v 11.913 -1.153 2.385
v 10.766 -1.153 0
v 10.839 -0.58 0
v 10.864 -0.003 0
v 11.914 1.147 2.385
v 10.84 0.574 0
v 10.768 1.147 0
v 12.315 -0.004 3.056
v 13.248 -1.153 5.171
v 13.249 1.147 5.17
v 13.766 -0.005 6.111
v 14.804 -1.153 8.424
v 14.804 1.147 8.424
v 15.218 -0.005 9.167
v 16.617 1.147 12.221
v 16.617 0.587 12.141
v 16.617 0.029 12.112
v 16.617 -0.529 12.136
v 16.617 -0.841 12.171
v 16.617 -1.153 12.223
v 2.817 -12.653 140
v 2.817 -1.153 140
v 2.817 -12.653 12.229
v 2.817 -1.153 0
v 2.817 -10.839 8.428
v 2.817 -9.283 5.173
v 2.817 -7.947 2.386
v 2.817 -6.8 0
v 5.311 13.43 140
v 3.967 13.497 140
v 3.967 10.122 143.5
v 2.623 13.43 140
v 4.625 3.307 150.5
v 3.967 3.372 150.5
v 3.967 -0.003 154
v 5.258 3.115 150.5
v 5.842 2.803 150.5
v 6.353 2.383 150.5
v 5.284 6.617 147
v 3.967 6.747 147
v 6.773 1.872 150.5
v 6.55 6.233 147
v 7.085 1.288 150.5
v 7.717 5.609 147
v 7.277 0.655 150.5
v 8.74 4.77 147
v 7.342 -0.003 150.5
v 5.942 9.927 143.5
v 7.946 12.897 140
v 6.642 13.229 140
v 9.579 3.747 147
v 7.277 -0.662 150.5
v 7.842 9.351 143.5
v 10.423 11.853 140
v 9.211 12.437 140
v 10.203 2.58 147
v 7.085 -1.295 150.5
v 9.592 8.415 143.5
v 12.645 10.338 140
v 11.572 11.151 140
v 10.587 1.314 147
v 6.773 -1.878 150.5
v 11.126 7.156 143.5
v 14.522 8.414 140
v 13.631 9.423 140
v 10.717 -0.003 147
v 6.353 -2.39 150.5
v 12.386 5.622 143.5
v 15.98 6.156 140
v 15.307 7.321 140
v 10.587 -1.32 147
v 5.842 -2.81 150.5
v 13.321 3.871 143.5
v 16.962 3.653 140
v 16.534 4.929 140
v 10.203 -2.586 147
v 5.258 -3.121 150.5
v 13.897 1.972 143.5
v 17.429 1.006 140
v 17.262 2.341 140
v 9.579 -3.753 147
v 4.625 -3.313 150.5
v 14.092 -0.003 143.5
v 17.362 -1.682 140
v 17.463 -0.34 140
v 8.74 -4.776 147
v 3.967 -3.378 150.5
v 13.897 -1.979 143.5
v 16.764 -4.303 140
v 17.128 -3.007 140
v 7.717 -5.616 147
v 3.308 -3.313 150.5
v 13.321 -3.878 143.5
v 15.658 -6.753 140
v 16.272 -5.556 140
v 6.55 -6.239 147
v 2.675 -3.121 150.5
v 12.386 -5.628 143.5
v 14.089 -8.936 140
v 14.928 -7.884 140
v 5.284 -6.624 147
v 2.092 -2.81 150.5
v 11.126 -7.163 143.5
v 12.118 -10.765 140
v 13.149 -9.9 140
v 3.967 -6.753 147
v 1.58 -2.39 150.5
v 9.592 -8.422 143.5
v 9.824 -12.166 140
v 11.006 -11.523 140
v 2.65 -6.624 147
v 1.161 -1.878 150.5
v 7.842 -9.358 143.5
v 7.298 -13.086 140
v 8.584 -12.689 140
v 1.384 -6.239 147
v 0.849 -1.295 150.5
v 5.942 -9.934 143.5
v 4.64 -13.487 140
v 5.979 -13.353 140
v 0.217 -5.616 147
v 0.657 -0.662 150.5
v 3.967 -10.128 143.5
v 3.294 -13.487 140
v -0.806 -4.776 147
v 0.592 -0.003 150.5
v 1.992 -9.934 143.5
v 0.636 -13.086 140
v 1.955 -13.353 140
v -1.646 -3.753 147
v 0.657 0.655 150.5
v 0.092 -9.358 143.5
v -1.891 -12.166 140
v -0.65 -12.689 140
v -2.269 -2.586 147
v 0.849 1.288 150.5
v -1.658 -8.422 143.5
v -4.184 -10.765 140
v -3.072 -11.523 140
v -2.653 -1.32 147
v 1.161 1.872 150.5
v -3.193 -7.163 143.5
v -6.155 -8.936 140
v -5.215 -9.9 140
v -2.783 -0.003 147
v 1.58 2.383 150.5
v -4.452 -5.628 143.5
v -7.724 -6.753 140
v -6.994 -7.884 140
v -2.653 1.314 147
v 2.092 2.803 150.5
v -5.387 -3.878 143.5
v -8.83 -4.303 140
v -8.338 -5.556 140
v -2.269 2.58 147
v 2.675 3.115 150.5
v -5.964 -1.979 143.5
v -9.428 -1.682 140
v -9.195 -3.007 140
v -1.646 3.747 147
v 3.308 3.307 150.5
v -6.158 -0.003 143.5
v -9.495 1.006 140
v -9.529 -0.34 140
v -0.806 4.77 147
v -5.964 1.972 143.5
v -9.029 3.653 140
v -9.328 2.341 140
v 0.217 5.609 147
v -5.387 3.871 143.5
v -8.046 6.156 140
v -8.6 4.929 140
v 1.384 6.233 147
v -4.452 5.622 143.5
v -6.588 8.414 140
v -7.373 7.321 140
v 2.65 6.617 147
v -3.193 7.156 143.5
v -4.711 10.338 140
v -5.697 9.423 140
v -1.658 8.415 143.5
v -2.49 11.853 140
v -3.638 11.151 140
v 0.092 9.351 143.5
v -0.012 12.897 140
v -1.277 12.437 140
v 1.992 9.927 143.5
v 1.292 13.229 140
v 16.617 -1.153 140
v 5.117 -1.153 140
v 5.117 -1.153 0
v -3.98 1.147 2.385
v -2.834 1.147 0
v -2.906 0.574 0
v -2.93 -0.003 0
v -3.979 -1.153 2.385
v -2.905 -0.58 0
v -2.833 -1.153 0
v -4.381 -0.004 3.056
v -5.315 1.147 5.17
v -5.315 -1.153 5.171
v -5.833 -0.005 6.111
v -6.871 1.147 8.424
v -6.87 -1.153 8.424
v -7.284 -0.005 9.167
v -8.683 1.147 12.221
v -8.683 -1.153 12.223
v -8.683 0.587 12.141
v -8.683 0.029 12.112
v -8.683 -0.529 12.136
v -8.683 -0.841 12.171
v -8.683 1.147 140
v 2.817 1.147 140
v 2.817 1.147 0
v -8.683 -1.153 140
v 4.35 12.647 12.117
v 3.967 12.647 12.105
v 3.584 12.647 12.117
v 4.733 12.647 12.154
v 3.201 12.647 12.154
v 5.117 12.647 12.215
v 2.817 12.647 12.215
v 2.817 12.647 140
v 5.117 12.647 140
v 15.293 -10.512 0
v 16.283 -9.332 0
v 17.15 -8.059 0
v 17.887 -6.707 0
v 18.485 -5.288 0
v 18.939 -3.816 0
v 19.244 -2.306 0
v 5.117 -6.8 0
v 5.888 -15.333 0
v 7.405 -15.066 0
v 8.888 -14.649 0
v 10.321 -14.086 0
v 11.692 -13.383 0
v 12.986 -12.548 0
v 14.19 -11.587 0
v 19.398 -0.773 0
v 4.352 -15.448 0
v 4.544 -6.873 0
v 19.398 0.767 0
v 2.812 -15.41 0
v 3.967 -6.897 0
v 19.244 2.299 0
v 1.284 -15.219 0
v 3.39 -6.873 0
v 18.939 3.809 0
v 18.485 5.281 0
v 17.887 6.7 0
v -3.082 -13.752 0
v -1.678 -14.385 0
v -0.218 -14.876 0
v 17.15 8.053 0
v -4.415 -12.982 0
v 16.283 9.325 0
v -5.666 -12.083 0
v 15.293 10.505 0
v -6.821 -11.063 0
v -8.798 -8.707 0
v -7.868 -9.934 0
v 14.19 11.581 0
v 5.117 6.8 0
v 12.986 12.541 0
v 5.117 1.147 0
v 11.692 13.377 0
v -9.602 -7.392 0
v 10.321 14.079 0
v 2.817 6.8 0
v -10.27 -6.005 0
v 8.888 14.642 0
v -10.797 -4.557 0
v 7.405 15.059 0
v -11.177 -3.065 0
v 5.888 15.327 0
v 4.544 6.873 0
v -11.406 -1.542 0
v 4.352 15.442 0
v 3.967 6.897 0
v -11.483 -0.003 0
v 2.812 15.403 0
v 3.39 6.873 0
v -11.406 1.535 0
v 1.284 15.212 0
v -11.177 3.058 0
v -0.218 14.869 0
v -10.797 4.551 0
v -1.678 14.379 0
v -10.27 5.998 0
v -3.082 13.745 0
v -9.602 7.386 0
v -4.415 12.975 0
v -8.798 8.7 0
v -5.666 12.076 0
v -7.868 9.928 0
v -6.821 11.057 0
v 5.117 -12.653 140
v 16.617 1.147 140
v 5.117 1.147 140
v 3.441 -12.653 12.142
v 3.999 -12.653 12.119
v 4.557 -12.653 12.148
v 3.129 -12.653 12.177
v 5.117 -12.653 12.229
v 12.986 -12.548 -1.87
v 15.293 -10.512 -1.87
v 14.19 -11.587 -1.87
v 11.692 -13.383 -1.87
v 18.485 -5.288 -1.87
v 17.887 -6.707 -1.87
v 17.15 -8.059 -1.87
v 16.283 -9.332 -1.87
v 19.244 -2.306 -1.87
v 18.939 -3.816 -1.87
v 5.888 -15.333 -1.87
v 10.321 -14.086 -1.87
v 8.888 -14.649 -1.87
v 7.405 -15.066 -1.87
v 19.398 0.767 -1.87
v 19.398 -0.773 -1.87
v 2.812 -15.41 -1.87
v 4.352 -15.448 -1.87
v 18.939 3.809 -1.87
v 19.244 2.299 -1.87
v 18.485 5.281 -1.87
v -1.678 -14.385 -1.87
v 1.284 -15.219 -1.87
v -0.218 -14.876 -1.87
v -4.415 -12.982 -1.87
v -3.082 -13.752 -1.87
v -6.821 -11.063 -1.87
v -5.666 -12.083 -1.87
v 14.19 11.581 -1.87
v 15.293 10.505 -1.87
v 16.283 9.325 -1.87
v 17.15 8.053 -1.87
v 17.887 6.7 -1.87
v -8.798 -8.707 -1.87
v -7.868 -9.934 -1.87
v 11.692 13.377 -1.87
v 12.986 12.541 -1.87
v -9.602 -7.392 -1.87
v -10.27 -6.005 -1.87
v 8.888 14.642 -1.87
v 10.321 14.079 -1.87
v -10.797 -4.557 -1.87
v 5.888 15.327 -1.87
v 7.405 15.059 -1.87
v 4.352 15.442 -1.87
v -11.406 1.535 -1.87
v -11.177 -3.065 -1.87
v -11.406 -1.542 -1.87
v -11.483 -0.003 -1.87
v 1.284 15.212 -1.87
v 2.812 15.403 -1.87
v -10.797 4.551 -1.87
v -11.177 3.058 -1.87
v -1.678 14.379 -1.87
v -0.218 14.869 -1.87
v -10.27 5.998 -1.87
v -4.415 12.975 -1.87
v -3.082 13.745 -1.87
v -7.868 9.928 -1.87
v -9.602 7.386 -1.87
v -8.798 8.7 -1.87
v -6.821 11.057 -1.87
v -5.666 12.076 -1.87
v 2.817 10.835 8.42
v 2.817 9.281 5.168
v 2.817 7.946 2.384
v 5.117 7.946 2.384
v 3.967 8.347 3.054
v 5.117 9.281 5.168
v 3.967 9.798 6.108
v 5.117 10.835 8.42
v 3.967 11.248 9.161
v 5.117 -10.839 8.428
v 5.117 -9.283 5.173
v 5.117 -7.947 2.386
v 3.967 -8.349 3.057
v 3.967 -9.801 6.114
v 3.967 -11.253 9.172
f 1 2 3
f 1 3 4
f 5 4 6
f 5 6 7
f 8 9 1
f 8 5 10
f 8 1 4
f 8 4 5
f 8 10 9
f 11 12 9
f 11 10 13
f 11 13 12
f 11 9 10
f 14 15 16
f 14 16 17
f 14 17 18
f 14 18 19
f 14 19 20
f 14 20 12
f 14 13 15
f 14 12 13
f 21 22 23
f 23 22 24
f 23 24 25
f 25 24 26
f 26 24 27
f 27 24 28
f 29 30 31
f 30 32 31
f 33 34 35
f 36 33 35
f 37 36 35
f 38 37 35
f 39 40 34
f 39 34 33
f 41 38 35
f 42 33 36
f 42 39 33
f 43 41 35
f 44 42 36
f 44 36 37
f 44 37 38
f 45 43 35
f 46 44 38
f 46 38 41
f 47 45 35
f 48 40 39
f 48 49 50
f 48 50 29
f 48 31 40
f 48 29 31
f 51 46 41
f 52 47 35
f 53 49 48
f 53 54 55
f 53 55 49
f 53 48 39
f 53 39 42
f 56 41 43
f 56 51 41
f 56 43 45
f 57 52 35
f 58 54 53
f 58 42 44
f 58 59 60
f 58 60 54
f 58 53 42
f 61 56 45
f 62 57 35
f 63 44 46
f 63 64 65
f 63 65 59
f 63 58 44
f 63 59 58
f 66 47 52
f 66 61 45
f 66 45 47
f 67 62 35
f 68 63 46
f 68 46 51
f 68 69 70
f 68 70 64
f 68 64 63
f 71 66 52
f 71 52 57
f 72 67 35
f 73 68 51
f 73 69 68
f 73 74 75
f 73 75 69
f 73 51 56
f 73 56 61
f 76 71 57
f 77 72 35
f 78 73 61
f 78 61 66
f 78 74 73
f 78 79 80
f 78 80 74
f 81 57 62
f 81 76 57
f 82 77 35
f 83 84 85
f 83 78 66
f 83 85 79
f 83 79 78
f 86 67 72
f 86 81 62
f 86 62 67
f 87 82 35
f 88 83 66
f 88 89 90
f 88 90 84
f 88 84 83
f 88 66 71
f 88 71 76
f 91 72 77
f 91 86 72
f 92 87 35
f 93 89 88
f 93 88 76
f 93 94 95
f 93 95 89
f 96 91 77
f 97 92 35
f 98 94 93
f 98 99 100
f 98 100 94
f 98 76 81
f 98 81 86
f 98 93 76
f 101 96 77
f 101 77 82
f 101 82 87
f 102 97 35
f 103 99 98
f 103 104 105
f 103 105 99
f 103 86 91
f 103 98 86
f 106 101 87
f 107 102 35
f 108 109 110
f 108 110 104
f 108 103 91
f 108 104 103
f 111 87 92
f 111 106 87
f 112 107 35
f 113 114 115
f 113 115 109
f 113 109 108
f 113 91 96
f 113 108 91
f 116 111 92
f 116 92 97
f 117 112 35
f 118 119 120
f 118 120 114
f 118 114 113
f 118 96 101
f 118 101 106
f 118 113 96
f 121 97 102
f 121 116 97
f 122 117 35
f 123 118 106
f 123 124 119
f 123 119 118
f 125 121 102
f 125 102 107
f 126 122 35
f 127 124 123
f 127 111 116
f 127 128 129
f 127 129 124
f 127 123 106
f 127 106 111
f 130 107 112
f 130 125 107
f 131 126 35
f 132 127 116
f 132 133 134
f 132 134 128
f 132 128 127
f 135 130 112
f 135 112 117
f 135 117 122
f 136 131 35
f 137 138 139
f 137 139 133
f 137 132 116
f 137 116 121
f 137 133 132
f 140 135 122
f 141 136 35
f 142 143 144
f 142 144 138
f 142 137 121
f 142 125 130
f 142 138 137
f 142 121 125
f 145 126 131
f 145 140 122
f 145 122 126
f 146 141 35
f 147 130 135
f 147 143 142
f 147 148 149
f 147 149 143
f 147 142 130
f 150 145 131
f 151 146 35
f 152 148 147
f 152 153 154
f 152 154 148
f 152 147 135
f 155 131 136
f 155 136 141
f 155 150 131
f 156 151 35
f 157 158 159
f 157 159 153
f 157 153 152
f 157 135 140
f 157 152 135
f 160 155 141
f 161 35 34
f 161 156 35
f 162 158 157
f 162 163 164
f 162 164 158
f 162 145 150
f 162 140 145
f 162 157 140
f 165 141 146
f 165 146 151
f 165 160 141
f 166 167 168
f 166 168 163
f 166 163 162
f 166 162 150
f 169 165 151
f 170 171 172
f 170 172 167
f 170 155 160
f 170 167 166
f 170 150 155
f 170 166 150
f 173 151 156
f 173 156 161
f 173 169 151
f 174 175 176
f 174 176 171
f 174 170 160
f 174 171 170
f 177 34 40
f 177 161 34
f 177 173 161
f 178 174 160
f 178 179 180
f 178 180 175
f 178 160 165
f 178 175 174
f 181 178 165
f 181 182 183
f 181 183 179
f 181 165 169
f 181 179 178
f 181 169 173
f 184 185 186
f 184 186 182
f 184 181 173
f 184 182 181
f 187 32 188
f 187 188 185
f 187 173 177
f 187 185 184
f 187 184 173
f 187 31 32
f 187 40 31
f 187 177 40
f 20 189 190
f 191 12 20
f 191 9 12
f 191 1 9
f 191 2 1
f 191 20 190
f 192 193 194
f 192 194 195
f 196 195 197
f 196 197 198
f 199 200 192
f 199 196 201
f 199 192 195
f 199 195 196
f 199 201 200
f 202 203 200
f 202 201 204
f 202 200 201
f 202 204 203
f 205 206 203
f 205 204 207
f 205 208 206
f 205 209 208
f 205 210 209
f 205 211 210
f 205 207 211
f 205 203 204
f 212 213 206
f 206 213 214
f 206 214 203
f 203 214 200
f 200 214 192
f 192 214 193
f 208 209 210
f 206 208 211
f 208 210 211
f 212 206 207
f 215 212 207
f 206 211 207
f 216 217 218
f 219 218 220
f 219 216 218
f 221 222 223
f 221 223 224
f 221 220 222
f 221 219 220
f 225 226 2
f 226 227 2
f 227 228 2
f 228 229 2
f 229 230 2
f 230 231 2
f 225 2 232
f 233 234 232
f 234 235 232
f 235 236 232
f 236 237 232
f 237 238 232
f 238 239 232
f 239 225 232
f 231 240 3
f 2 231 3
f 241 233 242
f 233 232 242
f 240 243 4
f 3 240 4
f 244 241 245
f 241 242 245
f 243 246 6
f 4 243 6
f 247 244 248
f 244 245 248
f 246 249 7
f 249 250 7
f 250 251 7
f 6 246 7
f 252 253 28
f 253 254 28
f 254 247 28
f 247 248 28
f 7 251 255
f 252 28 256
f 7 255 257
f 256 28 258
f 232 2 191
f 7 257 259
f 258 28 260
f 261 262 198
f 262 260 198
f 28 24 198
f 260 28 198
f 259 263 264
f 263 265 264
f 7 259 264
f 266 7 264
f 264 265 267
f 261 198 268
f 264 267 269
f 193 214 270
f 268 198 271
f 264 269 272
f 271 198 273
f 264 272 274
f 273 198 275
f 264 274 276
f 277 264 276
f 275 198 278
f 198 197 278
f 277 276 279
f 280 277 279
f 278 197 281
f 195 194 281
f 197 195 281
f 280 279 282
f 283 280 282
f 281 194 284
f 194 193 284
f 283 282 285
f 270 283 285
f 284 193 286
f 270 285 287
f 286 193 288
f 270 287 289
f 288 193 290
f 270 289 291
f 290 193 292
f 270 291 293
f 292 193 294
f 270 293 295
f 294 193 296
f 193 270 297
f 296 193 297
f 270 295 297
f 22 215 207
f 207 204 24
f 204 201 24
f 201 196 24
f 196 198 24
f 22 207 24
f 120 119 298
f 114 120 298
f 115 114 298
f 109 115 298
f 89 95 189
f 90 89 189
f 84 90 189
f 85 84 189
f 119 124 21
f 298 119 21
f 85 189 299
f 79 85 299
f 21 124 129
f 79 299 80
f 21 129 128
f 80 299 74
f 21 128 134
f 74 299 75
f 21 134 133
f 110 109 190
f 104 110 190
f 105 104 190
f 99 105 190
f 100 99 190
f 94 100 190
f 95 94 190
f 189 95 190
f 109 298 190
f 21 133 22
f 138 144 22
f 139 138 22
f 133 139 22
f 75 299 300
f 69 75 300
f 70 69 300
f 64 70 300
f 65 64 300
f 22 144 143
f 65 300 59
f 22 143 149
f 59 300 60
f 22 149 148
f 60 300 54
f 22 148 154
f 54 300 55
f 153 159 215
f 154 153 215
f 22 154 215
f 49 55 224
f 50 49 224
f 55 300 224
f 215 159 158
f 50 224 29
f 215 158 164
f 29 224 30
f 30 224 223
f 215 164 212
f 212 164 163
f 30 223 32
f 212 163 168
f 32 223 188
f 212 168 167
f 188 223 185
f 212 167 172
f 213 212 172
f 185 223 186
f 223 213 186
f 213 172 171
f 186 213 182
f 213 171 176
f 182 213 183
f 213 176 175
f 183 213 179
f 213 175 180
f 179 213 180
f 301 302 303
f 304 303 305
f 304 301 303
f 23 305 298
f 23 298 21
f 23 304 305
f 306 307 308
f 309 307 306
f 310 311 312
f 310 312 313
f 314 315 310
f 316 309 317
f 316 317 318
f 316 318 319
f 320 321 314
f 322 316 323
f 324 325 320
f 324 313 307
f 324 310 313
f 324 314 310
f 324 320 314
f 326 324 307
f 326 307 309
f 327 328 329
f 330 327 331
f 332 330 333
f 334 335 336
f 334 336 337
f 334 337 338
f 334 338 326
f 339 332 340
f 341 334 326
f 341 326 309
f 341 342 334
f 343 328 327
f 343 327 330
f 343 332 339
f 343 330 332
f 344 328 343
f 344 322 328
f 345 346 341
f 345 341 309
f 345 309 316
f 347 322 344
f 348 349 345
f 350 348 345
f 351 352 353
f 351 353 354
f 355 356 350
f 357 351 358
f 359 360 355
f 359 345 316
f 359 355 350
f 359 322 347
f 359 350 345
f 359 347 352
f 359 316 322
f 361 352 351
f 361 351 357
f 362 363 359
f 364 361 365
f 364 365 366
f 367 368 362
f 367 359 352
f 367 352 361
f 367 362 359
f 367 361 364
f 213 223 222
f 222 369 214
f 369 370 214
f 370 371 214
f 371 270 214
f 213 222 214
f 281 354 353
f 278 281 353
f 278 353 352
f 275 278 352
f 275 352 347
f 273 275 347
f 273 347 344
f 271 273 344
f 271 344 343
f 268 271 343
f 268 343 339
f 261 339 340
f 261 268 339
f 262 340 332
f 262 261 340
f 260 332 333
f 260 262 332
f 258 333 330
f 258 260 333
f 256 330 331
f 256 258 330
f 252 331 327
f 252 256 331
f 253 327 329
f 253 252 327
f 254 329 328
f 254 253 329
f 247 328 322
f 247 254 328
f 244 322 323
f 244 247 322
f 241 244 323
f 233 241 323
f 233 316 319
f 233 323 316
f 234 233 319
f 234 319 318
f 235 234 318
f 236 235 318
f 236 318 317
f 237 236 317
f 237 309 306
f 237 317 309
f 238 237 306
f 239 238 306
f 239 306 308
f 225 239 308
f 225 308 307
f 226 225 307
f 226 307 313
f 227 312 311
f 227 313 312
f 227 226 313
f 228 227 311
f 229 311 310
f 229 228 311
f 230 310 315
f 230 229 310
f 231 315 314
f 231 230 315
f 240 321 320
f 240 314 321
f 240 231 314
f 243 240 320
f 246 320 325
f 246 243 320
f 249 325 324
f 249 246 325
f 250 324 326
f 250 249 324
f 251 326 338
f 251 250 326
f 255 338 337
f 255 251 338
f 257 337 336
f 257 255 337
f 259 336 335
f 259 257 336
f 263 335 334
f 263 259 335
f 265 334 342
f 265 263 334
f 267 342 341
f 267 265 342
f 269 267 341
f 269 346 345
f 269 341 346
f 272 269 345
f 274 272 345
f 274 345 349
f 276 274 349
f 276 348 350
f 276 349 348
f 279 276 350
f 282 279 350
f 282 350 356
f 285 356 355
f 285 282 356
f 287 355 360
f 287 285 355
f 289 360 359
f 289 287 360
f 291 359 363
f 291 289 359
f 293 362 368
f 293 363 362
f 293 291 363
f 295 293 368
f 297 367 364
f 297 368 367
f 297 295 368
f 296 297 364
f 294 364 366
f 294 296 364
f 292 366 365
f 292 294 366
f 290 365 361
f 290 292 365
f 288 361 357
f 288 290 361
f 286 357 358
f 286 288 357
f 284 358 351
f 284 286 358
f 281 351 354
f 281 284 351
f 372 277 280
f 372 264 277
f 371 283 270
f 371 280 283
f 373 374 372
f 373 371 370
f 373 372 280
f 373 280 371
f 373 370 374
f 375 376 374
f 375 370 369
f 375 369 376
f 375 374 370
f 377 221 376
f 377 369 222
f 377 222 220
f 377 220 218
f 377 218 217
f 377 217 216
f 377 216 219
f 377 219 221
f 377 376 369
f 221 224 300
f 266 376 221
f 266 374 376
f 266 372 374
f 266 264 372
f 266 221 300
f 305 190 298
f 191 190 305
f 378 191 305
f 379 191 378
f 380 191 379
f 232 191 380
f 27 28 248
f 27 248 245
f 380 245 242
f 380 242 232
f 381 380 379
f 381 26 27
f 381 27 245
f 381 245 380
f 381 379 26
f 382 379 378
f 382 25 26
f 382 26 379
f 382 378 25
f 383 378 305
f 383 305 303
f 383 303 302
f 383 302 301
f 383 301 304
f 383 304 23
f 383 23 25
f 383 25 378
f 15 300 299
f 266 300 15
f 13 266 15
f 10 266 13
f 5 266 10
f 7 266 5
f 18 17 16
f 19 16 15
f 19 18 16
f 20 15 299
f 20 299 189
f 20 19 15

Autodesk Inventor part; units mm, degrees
ref_plane "YZ Plane" through (0, 0, 0) normal (1, 0, 0) x (0, 1, 0)
ref_plane "XZ Plane" through (0, 0, 0) normal (0, 1, 0) x (-1, 0, 0)
ref_plane "XY Plane" through (0, 0, 0) normal (0, 0, 1) x (1, 0, 0)
sketch "Sketch1" plane through (0, 0, 0) normal (0, 0, 1) x (1, 0, 0)
  line L0 (3.9669, 12.6467) -> (5.1169, 12.6467)
  line L1 (5.1169, 12.6467) -> (5.1169, 1.1467)
  line L2 (5.1169, 1.1467) -> (16.6169, 1.1467)
  line L3 (16.6169, 1.1467) -> (16.6169, -1.1533)
  line L4 (16.6169, -1.1533) -> (5.1169, -1.1533)
  line L5 (5.1169, -1.1533) -> (5.1169, -12.6533)
  line L6 (5.1169, -12.6533) -> (3.9669, -12.6533)
  line L7 (3.9669, 12.6467) -> (2.8169, 12.6467)
  line L8 (2.8169, 12.6467) -> (2.8169, 1.1467)
  line L9 (2.8169, 1.1467) -> (-8.6831, 1.1467)
  line L10 (-8.6831, 1.1467) -> (-8.6831, -1.1533)
  line L11 (-8.6831, -1.1533) -> (2.8169, -1.1533)
  line L12 (2.8169, -1.1533) -> (2.8169, -12.6533)
  line L13 (2.8169, -12.6533) -> (3.9669, -12.6533)
  point P0 (0, 0)
  dimension "d0" = 1.15
  dimension "d1" = 2.3
  dimension "d2" = 11.5
  dimension "d3" = 11.5
  dimension "d4" = 11.5
  dimension "d5" = 11.5
  dimension "d6" = 1.15
extrude "Extrusion1" add sketch "Sketch1" along normal blind 140
ref_plane "Work Plane1" through (3.9669, 1.1467, 0) normal (-1, 0, 0) x (0, 0, 1)
sketch "Sketch4" plane through (3.9669, 1.1467, 0) normal (-1, 0, 0) x (0, 0, 1)
  line L0 (3.9669, 12.6467) -> (5.1169, 12.6467)
  line L1 (5.1169, 12.6467) -> (5.1169, 1.1467)
  line L2 (5.1169, 1.1467) -> (16.6169, 1.1467)
  line L3 (16.6169, 1.1467) -> (16.6169, -1.1533)
  line L4 (16.6169, -1.1533) -> (5.1169, -1.1533)
  line L5 (5.1169, -1.1533) -> (5.1169, -12.6533)
  line L6 (5.1169, -12.6533) -> (3.9669, -12.6533)
  line L7 (2.8169, 12.6467) -> (2.8169, 1.1467)
  line L8 (2.8169, 1.1467) -> (-8.6831, 1.1467)
  line L9 (-8.6831, 1.1467) -> (-8.6831, -1.1533)
  line L10 (-8.6831, -1.1533) -> (2.8169, -1.1533)
  line L11 (2.8169, -1.1533) -> (2.8169, -12.6533)
  line L12 (2.8169, -12.6533) -> (3.9669, -12.6533)
  line L13 (3.9669, 12.6467) -> (2.8169, 12.6467)
  line L14 (140, -13.8) -> (140, 11.5) projected
  line L15 (140, -13.6427) -> (140, -13.8) projected
  line L16 (140, -2.3) -> (140, -13.6427) projected
  line L17 (140, 0) -> (140, -2.3) projected
  line L18 (140, 11.3427) -> (140, 0) projected
  line L19 (140, 11.5) -> (140, 11.3427) projected
  line L20 (154, -1.15) -> (140, 12.35)
  line L21 (140, 11.3427) -> (140, 0) projected
  line L22 (154, -1.15) -> (140, -1.15)
  line L23 (140, 12.35) -> (140, -1.15)
  line L24 (154.6806, -1.15) -> (155.8888, -1.15)
  point P0 (0, -1.1467)
  point P1 (0, 0)
  point P2 (154, -1.15)
  dimension "d13" = 1.15
  dimension "d14" = 2.3
  dimension "d15" = 11.5
  dimension "d16" = 11.5
  dimension "d17" = 11.5
  dimension "d18" = 11.5
  dimension "d19" = 1.15
revolve "Revolution2" add sketch "Sketch4" angle 360 about axis through (3.9669, -0.0033, 154.6806) along (0, 0, 1) contours L14 L23 L20 L22
sketch "Sketch5" plane through (0, 0, 0) normal (0, 0, -1) x (-1, 0, 0)
  circle A0 centre (-3.9669, -0.0033) radius 13.5 projected
  circle A1 centre (-3.9669, -0.0033) radius 15.45
  point P0 (0, 0)
  dimension "d21" = 30.9
extrude "Extrusion2" add sketch "Sketch5" along normal blind 1.87 contours A0 | A1
sketch "Sketch6" plane through (3.9669, 1.1467, 0) normal (-1, 0, 0) x (0, 0, 1)
  line L0 (0, 11.5) -> (0, 0) projected
  line L1 (0, 11.5) -> (140, 11.5) projected
  line L2 (0, -1.1467) -> (5.329, -1.1467)
  line L3 (0, 14.3) -> (-1.87, 14.3) projected
  line L4 (0, 14.3) -> (0, 7.3)
  line L5 (0, 0) -> (0, 11.5) projected
  line L6 (0, 14.3) -> (18, 14.3)
  line L7 (18, 14.3) -> (0, 5.75)
  point P0 (0, 7.85)
  point P1 (12, 11.5)
  dimension "d27" = 7
revolve "Revolution3" cut sketch "Sketch6" angle 360 about axis through (3.9669, 0, 0) along (0, 0, 1)
properties part number "syringe inner"
